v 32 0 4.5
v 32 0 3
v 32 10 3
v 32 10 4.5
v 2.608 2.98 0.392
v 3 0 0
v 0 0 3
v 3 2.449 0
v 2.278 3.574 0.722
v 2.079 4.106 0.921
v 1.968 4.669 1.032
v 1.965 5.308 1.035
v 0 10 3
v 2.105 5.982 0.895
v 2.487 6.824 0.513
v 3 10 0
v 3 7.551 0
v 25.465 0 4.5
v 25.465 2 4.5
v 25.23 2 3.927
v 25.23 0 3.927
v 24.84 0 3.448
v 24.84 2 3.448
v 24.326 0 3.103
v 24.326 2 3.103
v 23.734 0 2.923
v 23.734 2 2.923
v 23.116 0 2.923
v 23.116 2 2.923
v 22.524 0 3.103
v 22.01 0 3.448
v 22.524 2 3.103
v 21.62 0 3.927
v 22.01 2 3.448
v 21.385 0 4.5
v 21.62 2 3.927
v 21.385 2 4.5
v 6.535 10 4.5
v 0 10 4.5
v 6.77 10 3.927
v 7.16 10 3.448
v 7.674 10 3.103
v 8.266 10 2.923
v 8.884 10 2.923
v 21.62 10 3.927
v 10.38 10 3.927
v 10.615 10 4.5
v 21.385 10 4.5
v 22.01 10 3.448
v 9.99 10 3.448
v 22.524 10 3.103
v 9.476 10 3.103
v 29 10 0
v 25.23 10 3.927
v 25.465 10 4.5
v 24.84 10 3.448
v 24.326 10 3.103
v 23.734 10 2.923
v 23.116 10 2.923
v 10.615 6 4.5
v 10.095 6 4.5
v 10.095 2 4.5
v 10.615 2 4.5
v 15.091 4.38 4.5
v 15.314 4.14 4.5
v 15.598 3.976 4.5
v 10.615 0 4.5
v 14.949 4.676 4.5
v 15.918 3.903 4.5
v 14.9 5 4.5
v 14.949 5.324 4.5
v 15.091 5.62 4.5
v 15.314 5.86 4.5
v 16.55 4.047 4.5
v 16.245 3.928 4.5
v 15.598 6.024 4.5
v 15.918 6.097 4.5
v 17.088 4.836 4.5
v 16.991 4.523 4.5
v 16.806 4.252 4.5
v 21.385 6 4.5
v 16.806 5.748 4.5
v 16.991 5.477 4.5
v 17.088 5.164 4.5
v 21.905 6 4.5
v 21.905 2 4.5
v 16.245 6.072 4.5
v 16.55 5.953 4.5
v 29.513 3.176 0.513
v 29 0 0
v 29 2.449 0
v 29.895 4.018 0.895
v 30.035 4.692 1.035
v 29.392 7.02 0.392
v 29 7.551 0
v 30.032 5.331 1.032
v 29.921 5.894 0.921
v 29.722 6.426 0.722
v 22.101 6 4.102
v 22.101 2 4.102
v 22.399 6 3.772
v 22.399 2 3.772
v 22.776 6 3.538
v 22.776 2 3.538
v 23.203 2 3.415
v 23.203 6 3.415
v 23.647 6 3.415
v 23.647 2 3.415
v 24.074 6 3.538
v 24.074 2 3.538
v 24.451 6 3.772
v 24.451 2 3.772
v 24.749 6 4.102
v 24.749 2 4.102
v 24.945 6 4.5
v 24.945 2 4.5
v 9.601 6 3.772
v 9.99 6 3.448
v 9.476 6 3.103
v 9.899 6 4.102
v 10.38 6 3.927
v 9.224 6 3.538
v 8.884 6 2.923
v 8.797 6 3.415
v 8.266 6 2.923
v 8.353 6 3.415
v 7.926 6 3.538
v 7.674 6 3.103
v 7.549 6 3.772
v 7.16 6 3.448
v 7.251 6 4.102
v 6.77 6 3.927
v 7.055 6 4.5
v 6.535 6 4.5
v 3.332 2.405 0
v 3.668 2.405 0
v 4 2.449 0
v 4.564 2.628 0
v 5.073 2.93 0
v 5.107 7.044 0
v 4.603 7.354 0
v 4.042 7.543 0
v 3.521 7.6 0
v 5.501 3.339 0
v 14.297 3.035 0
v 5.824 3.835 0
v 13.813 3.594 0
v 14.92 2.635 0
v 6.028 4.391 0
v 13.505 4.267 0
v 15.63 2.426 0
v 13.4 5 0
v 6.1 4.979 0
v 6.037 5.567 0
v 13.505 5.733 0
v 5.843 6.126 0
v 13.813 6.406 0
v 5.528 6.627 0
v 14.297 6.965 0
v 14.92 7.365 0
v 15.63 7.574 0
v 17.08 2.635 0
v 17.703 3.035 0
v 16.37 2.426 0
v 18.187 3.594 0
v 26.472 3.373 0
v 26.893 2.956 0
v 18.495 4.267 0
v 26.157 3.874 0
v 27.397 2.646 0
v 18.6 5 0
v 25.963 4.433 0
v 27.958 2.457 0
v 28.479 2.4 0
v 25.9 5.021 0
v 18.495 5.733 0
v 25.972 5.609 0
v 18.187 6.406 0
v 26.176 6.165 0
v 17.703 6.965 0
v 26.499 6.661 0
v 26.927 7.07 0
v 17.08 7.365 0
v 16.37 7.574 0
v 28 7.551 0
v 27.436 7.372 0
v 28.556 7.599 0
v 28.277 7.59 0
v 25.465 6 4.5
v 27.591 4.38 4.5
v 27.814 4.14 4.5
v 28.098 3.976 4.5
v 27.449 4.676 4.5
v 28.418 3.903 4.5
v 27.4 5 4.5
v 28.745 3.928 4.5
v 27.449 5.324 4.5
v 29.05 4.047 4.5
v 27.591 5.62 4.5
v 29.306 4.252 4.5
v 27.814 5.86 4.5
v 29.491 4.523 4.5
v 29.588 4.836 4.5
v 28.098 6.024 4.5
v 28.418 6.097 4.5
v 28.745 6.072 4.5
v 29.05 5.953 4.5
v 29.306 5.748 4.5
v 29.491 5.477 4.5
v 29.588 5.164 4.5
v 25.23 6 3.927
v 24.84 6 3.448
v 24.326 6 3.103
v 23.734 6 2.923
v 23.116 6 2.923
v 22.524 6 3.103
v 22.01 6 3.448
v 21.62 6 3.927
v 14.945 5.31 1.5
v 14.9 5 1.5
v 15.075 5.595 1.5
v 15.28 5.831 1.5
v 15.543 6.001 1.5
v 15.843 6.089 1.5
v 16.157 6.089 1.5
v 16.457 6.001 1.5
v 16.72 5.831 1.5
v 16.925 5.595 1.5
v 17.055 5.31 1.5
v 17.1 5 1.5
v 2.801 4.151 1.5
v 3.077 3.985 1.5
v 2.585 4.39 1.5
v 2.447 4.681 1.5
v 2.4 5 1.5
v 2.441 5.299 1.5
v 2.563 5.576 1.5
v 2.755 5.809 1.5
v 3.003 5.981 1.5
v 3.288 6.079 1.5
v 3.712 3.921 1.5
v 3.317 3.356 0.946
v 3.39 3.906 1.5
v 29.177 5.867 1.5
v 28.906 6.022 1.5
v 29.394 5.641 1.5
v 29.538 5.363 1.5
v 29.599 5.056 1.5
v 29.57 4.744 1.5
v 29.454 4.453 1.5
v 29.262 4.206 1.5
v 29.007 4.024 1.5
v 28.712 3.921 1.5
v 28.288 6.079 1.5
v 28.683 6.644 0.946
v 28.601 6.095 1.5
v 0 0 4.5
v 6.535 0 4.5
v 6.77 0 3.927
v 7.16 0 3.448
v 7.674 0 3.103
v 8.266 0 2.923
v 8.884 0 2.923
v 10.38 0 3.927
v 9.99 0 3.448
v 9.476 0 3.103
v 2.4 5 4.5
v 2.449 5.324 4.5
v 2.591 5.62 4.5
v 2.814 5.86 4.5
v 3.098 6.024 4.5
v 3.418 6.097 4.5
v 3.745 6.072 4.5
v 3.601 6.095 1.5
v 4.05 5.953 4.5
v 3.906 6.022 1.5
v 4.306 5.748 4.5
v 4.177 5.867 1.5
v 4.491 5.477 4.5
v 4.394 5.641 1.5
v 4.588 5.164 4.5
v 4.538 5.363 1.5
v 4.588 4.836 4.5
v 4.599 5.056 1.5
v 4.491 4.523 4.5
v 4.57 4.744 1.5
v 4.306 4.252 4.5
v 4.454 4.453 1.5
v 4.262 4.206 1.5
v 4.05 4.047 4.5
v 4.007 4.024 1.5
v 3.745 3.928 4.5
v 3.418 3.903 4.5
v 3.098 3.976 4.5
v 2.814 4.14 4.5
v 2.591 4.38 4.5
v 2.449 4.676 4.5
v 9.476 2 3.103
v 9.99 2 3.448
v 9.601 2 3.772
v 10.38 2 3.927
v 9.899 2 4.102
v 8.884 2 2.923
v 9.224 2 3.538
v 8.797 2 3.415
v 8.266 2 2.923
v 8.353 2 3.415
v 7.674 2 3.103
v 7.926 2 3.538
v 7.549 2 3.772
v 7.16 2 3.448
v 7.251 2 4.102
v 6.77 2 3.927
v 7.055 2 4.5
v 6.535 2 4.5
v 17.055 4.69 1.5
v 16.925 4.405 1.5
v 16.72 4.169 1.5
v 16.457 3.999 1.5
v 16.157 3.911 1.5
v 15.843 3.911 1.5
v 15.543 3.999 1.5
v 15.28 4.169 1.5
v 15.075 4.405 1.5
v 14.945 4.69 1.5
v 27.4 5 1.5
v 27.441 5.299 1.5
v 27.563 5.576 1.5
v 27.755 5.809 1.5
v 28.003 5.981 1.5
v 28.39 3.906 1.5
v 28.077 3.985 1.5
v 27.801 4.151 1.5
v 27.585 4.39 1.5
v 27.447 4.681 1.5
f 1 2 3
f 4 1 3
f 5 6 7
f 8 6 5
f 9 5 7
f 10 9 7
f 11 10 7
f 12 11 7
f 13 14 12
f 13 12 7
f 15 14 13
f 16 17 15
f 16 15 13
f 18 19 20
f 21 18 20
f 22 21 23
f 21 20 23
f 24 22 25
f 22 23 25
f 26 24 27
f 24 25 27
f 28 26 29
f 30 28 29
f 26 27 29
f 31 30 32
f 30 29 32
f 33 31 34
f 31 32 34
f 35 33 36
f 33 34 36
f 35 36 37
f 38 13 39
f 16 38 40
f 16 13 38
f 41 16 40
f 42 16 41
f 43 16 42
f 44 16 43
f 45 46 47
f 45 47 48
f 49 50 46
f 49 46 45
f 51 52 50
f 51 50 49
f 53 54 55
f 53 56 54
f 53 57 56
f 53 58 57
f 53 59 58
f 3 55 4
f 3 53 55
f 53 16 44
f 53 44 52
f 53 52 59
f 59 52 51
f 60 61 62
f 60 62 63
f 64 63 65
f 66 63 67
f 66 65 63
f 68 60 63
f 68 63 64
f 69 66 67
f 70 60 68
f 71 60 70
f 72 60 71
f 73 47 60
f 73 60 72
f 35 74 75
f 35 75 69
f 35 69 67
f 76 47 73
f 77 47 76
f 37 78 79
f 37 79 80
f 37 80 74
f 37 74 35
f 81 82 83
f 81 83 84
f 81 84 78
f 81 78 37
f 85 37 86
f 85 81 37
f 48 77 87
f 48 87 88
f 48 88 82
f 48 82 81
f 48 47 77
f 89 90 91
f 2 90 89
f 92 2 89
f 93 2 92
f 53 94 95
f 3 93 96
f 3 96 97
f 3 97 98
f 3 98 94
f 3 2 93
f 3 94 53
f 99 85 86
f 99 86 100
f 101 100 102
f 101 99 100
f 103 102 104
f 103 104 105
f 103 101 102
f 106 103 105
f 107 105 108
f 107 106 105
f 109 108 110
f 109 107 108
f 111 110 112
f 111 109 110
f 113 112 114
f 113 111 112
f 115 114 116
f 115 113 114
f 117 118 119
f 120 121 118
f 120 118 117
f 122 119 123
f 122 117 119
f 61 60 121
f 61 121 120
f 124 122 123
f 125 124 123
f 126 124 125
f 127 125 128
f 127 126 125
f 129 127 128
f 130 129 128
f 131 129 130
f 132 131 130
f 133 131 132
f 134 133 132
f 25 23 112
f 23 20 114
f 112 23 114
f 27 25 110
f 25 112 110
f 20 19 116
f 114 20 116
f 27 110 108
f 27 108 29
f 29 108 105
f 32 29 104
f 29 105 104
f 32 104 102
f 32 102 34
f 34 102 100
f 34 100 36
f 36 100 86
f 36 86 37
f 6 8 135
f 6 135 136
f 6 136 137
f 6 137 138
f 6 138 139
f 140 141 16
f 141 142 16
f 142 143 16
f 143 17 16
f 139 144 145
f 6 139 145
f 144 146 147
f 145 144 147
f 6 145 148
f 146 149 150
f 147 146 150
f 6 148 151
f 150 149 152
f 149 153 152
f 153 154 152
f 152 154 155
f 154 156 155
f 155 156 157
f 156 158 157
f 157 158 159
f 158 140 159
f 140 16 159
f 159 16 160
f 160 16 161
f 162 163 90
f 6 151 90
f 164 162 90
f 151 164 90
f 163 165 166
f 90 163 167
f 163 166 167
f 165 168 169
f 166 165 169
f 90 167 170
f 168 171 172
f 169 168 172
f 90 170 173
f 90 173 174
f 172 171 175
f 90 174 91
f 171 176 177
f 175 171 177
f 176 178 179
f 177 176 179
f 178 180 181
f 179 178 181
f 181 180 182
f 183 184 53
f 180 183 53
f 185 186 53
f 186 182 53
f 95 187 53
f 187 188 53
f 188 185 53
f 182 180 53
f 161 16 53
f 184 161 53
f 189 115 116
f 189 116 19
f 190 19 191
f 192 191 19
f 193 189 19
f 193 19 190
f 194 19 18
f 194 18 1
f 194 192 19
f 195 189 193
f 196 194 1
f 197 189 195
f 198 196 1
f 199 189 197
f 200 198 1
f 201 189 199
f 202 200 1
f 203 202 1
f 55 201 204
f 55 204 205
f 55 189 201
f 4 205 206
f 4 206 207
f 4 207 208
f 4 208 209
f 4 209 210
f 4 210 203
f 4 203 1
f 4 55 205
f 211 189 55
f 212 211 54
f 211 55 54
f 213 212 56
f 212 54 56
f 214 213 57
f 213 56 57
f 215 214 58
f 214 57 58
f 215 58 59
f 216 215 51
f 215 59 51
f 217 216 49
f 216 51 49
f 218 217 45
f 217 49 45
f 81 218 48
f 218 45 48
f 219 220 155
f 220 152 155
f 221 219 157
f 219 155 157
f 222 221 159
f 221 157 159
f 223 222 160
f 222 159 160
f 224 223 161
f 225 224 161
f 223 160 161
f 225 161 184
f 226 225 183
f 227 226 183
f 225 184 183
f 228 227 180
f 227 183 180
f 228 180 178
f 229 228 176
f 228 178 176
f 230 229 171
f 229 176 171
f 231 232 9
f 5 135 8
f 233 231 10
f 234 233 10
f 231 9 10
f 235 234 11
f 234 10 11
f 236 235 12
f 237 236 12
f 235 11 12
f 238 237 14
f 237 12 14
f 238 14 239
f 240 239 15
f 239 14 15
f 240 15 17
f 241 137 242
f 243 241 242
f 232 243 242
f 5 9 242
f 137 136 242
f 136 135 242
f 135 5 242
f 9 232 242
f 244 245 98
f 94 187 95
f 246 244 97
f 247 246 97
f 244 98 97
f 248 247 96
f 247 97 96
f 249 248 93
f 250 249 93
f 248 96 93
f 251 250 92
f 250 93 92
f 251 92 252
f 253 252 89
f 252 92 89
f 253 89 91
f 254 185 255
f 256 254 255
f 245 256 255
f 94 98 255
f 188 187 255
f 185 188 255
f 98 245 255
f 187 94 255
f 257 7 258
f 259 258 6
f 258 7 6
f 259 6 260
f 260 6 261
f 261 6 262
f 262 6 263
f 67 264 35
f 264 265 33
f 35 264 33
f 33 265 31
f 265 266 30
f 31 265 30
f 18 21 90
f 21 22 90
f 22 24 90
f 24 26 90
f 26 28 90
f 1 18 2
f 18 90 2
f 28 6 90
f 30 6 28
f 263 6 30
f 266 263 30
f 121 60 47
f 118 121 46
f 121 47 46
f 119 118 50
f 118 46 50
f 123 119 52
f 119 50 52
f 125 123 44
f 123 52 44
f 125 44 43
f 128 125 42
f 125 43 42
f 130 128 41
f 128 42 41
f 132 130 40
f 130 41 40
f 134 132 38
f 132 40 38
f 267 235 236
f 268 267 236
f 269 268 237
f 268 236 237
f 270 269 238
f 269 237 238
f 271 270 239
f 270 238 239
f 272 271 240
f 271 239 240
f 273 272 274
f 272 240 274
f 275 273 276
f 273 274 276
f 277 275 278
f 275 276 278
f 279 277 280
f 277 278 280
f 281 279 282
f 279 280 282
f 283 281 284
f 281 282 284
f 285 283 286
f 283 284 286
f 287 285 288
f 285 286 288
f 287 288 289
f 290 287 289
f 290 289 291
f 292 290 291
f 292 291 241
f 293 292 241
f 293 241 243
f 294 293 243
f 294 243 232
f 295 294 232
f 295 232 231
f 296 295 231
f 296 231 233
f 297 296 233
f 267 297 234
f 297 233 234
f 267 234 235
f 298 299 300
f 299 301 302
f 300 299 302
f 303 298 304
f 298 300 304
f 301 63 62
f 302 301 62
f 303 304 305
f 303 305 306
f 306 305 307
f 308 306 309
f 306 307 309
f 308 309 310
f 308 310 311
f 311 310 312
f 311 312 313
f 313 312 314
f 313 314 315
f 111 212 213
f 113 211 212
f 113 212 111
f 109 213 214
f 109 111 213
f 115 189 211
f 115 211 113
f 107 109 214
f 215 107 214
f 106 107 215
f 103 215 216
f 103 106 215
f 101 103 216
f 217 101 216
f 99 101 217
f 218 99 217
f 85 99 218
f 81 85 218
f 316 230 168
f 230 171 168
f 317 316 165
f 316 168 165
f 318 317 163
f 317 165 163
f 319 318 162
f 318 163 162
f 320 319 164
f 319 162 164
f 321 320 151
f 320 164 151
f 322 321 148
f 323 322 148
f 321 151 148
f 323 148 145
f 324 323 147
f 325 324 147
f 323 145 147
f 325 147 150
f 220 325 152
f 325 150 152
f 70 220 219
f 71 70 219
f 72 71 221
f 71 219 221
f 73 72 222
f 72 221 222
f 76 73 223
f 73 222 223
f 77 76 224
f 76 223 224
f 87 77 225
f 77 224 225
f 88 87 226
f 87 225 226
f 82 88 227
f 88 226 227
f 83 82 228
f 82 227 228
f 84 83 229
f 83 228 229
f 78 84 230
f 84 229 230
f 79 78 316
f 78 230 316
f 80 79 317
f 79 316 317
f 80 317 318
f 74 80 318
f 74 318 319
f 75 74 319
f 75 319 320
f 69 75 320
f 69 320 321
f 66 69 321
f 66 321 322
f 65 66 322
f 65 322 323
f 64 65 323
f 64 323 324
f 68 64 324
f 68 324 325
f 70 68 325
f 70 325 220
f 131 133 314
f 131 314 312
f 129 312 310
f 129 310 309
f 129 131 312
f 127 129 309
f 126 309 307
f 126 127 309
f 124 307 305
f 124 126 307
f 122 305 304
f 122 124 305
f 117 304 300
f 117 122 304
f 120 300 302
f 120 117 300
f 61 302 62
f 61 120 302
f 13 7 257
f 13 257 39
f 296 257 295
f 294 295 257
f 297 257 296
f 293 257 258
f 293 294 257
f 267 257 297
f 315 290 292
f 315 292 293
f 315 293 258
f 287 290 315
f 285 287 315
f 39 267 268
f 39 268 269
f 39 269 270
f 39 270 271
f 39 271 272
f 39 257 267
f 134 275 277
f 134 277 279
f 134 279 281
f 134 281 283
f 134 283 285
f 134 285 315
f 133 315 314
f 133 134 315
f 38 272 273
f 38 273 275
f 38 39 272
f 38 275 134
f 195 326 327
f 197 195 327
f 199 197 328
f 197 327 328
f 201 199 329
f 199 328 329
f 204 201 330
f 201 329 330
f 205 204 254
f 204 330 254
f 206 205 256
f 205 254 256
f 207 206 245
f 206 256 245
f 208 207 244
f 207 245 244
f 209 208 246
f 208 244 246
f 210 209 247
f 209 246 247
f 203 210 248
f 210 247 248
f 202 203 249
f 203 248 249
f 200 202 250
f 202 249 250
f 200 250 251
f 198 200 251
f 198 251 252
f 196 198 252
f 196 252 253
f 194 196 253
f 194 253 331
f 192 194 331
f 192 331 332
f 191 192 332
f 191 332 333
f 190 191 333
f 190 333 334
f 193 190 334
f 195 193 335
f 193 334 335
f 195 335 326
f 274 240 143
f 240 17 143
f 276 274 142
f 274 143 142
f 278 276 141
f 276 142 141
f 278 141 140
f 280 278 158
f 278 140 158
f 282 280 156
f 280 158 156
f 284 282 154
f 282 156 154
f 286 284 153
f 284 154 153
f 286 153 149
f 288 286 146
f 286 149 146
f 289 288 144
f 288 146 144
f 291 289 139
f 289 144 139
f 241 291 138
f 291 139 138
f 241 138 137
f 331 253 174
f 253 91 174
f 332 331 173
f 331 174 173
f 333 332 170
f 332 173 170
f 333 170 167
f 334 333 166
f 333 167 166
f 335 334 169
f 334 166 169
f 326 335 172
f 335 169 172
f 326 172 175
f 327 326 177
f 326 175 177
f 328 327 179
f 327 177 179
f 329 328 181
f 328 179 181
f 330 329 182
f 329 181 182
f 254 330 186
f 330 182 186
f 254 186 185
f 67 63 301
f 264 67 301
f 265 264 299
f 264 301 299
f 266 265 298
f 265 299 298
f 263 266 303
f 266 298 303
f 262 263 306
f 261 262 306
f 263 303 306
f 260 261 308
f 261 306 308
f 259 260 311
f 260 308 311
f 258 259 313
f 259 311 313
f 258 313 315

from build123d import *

# Parameters (mm, degrees)
SKETCH_1_W          = 32
SKETCH_1_H          = 10
EXTRUDE_1_DEPTH     = 4.5
SKETCH_2_R          = 2.1
CUT_EXTRUDE_1_DEPTH = 34.826764551
EXTRUDE_2_DEPTH     = 4
CHAMFER_1_SIZE      = 3
SKETCH_5_R          = 1.1
CUT_EXTRUDE_2_DEPTH = 34.826764551


with BuildPart() as part:
    # Эскиз1 → Бобышка-Вытянуть1 (new body)
    with BuildSketch(Plane.XY):
        with Locations((16, 5)):
            Rectangle(SKETCH_1_W, SKETCH_1_H)
    extrude(amount=EXTRUDE_1_DEPTH)

    # Эскиз2 → Вырез-Вытянуть1 (cut, through all)
    with BuildSketch(Plane(origin=(0, 10, 0), x_dir=(1, 0, 0), z_dir=(0, 1, 0))):
        with Locations((8.575, -5)):
            Circle(SKETCH_2_R)
        with Locations((23.425, -5)):
            Circle(SKETCH_2_R)
    extrude(amount=-CUT_EXTRUDE_1_DEPTH, mode=Mode.SUBTRACT)

    # Эскиз4 → Бобышка-Вытянуть2 (add)
    with BuildSketch(Plane.XZ.offset(-6)):
        with BuildLine():
            Line((6.535392195, 4.5), (7.055131585, 4.5))
            ThreePointArc((7.055131585, 4.5), (8.575, 3.4), (10.094868415, 4.5))
            Line((10.094868415, 4.5), (10.614607805, 4.5))
            ThreePointArc((10.614607805, 4.5), (8.575, 2.9), (6.535392195, 4.5))
        make_face()
        with BuildLine():
            Line((21.385392195, 4.5), (21.905131585, 4.5))
            ThreePointArc((21.905131585, 4.5), (23.425, 3.4), (24.944868415, 4.5))
            Line((24.944868415, 4.5), (25.464607805, 4.5))
            ThreePointArc((25.464607805, 4.5), (23.425, 2.9), (21.385392195, 4.5))
        make_face()
    extrude(amount=EXTRUDE_2_DEPTH)

    # Фаска1
    chamfer_1_edges = [part.edges().sort_by_distance(p)[0] for p in [
        (0, 5, 0),
        (32, 5, 0),
    ]]
    chamfer(chamfer_1_edges, length=CHAMFER_1_SIZE)

    # Эскиз5 → Вырез-Вытянуть2 (cut, through all)
    with BuildSketch(Plane(origin=(0, 0, 0), x_dir=(-1, 0, 0), z_dir=(0, 0, -1))):
        with Locations((-28.5, 5)):
            Circle(SKETCH_5_R)
        with Locations((-16, 5)):
            Circle(SKETCH_5_R)
        with Locations((-3.5, 5)):
            Circle(SKETCH_5_R)
    extrude(amount=-CUT_EXTRUDE_2_DEPTH, mode=Mode.SUBTRACT)

    # Фаска2: read off the stored shape, not the designer's step
    # Фаска2: loft between two sections, ruled curve by curve
    chamfer_2_from = [
        Edge.make_three_point_arc((3.288461538, 6.079468146, 1.5), (4.579468146, 5.211538462, 1.5), (3.711538462, 3.920531854, 1.5)),
        Edge.make_three_point_arc((3.711538462, 3.920531854, 1.5), (2.420531854, 4.788461538, 1.5), (3.288461538, 6.079468146, 1.5)),
    ]
    chamfer_2_to = [
        Edge.make_three_point_arc((2.999999479, 7.551472823, -2.709e-06), (6.051472823, 5.500000521, -2.709e-06), (4.000000521, 2.448527177, -2.709e-06)),
        Edge.make_three_point_arc((4.000000521, 2.448527177, -2.709e-06), (0.948527177, 4.499999479, -2.709e-06), (2.999999479, 7.551472823, -2.709e-06)),
    ]
    chamfer_2 = Solid(Shell([*[Face.make_surface_from_curves(chamfer_2_from[k], chamfer_2_to[k]) for k in range(2)], Face(Wire(chamfer_2_from)), Face(Wire(chamfer_2_to))]))
    add(chamfer_2, mode=Mode.SUBTRACT)

    # Chamfer 2 2: loft between two sections, ruled curve by curve
    chamfer_2_2_from = [
        Edge.make_three_point_arc((17.1, 5, 1.5), (16, 3.9, 1.5), (14.9, 5, 1.5)),
        Edge.make_three_point_arc((14.9, 5, 1.5), (16, 6.1, 1.5), (17.1, 5, 1.5)),
    ]
    chamfer_2_2_to = [
        Edge.make_three_point_arc((18.6, 5, 0), (16, 2.4, 0), (13.4, 5, 0)),
        Edge.make_three_point_arc((13.4, 5, 0), (16, 7.6, 0), (18.6, 5, 0)),
    ]
    chamfer_2_2 = Solid(Shell([*[Face.make_surface_from_curves(chamfer_2_2_from[k], chamfer_2_2_to[k]) for k in range(2)], Face(Wire(chamfer_2_2_from)), Face(Wire(chamfer_2_2_to))]))
    add(chamfer_2_2, mode=Mode.SUBTRACT)

    # Chamfer 2 3: loft between two sections, ruled curve by curve
    chamfer_2_3_from = [
        Edge.make_three_point_arc((28.711538462, 3.920531854, 1.5), (27.420531854, 4.788461538, 1.5), (28.288461538, 6.079468146, 1.5)),
        Edge.make_three_point_arc((28.288461538, 6.079468146, 1.5), (29.579468146, 5.211538462, 1.5), (28.711538462, 3.920531854, 1.5)),
    ]
    chamfer_2_3_to = [
        Edge.make_three_point_arc((29.000000521, 2.448527177, -2.709e-06), (25.948527177, 4.499999479, -2.709e-06), (27.999999479, 7.551472823, -2.709e-06)),
        Edge.make_three_point_arc((27.999999479, 7.551472823, -2.709e-06), (31.051472823, 5.500000521, -2.709e-06), (29.000000521, 2.448527177, -2.709e-06)),
    ]
    chamfer_2_3 = Solid(Shell([*[Face.make_surface_from_curves(chamfer_2_3_from[k], chamfer_2_3_to[k]) for k in range(2)], Face(Wire(chamfer_2_3_from)), Face(Wire(chamfer_2_3_to))]))
    add(chamfer_2_3, mode=Mode.SUBTRACT)


solid = part.part
